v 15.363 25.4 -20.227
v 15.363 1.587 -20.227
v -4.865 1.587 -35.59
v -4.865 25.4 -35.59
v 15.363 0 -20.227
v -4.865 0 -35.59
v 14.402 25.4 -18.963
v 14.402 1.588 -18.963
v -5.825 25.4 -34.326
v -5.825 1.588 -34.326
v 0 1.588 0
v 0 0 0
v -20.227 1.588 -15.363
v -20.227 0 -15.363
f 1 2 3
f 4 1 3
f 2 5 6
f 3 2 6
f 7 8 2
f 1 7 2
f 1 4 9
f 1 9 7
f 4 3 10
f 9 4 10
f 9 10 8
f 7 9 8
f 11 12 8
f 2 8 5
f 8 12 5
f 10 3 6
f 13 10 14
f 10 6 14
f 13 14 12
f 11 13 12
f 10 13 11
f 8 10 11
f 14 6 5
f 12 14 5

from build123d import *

# Parameters (mm, degrees)
BOSS_EXTRUDE1_DEPTH = 1.5875
BOSS_EXTRUDE2_DEPTH = 23.8125


with BuildPart() as part:
    # Sketch1 → Boss-Extrude1 (new body)
    with BuildSketch(Plane(origin=(0, 0, 0), x_dir=(1, 0, 0), z_dir=(0, 1, 0))):
        Polygon((0, 0), (15.362627366, 20.227448688), (-4.864821322, 35.590076054), (-20.227448688, 15.362627366), align=None)
    extrude(amount=BOSS_EXTRUDE1_DEPTH)

    # Sketch2 → Boss-Extrude2 (add)
    with BuildSketch(Plane(origin=(0, 1.5875, 0), x_dir=(1, 0, 0), z_dir=(0, 1, 0))):
        Polygon((-4.864821322, 35.590076054), (-5.824985532, 34.325860511), (14.402463156, 18.963233145), (15.362627366, 20.227448688), align=None)
    extrude(amount=BOSS_EXTRUDE2_DEPTH)


solid = part.part
